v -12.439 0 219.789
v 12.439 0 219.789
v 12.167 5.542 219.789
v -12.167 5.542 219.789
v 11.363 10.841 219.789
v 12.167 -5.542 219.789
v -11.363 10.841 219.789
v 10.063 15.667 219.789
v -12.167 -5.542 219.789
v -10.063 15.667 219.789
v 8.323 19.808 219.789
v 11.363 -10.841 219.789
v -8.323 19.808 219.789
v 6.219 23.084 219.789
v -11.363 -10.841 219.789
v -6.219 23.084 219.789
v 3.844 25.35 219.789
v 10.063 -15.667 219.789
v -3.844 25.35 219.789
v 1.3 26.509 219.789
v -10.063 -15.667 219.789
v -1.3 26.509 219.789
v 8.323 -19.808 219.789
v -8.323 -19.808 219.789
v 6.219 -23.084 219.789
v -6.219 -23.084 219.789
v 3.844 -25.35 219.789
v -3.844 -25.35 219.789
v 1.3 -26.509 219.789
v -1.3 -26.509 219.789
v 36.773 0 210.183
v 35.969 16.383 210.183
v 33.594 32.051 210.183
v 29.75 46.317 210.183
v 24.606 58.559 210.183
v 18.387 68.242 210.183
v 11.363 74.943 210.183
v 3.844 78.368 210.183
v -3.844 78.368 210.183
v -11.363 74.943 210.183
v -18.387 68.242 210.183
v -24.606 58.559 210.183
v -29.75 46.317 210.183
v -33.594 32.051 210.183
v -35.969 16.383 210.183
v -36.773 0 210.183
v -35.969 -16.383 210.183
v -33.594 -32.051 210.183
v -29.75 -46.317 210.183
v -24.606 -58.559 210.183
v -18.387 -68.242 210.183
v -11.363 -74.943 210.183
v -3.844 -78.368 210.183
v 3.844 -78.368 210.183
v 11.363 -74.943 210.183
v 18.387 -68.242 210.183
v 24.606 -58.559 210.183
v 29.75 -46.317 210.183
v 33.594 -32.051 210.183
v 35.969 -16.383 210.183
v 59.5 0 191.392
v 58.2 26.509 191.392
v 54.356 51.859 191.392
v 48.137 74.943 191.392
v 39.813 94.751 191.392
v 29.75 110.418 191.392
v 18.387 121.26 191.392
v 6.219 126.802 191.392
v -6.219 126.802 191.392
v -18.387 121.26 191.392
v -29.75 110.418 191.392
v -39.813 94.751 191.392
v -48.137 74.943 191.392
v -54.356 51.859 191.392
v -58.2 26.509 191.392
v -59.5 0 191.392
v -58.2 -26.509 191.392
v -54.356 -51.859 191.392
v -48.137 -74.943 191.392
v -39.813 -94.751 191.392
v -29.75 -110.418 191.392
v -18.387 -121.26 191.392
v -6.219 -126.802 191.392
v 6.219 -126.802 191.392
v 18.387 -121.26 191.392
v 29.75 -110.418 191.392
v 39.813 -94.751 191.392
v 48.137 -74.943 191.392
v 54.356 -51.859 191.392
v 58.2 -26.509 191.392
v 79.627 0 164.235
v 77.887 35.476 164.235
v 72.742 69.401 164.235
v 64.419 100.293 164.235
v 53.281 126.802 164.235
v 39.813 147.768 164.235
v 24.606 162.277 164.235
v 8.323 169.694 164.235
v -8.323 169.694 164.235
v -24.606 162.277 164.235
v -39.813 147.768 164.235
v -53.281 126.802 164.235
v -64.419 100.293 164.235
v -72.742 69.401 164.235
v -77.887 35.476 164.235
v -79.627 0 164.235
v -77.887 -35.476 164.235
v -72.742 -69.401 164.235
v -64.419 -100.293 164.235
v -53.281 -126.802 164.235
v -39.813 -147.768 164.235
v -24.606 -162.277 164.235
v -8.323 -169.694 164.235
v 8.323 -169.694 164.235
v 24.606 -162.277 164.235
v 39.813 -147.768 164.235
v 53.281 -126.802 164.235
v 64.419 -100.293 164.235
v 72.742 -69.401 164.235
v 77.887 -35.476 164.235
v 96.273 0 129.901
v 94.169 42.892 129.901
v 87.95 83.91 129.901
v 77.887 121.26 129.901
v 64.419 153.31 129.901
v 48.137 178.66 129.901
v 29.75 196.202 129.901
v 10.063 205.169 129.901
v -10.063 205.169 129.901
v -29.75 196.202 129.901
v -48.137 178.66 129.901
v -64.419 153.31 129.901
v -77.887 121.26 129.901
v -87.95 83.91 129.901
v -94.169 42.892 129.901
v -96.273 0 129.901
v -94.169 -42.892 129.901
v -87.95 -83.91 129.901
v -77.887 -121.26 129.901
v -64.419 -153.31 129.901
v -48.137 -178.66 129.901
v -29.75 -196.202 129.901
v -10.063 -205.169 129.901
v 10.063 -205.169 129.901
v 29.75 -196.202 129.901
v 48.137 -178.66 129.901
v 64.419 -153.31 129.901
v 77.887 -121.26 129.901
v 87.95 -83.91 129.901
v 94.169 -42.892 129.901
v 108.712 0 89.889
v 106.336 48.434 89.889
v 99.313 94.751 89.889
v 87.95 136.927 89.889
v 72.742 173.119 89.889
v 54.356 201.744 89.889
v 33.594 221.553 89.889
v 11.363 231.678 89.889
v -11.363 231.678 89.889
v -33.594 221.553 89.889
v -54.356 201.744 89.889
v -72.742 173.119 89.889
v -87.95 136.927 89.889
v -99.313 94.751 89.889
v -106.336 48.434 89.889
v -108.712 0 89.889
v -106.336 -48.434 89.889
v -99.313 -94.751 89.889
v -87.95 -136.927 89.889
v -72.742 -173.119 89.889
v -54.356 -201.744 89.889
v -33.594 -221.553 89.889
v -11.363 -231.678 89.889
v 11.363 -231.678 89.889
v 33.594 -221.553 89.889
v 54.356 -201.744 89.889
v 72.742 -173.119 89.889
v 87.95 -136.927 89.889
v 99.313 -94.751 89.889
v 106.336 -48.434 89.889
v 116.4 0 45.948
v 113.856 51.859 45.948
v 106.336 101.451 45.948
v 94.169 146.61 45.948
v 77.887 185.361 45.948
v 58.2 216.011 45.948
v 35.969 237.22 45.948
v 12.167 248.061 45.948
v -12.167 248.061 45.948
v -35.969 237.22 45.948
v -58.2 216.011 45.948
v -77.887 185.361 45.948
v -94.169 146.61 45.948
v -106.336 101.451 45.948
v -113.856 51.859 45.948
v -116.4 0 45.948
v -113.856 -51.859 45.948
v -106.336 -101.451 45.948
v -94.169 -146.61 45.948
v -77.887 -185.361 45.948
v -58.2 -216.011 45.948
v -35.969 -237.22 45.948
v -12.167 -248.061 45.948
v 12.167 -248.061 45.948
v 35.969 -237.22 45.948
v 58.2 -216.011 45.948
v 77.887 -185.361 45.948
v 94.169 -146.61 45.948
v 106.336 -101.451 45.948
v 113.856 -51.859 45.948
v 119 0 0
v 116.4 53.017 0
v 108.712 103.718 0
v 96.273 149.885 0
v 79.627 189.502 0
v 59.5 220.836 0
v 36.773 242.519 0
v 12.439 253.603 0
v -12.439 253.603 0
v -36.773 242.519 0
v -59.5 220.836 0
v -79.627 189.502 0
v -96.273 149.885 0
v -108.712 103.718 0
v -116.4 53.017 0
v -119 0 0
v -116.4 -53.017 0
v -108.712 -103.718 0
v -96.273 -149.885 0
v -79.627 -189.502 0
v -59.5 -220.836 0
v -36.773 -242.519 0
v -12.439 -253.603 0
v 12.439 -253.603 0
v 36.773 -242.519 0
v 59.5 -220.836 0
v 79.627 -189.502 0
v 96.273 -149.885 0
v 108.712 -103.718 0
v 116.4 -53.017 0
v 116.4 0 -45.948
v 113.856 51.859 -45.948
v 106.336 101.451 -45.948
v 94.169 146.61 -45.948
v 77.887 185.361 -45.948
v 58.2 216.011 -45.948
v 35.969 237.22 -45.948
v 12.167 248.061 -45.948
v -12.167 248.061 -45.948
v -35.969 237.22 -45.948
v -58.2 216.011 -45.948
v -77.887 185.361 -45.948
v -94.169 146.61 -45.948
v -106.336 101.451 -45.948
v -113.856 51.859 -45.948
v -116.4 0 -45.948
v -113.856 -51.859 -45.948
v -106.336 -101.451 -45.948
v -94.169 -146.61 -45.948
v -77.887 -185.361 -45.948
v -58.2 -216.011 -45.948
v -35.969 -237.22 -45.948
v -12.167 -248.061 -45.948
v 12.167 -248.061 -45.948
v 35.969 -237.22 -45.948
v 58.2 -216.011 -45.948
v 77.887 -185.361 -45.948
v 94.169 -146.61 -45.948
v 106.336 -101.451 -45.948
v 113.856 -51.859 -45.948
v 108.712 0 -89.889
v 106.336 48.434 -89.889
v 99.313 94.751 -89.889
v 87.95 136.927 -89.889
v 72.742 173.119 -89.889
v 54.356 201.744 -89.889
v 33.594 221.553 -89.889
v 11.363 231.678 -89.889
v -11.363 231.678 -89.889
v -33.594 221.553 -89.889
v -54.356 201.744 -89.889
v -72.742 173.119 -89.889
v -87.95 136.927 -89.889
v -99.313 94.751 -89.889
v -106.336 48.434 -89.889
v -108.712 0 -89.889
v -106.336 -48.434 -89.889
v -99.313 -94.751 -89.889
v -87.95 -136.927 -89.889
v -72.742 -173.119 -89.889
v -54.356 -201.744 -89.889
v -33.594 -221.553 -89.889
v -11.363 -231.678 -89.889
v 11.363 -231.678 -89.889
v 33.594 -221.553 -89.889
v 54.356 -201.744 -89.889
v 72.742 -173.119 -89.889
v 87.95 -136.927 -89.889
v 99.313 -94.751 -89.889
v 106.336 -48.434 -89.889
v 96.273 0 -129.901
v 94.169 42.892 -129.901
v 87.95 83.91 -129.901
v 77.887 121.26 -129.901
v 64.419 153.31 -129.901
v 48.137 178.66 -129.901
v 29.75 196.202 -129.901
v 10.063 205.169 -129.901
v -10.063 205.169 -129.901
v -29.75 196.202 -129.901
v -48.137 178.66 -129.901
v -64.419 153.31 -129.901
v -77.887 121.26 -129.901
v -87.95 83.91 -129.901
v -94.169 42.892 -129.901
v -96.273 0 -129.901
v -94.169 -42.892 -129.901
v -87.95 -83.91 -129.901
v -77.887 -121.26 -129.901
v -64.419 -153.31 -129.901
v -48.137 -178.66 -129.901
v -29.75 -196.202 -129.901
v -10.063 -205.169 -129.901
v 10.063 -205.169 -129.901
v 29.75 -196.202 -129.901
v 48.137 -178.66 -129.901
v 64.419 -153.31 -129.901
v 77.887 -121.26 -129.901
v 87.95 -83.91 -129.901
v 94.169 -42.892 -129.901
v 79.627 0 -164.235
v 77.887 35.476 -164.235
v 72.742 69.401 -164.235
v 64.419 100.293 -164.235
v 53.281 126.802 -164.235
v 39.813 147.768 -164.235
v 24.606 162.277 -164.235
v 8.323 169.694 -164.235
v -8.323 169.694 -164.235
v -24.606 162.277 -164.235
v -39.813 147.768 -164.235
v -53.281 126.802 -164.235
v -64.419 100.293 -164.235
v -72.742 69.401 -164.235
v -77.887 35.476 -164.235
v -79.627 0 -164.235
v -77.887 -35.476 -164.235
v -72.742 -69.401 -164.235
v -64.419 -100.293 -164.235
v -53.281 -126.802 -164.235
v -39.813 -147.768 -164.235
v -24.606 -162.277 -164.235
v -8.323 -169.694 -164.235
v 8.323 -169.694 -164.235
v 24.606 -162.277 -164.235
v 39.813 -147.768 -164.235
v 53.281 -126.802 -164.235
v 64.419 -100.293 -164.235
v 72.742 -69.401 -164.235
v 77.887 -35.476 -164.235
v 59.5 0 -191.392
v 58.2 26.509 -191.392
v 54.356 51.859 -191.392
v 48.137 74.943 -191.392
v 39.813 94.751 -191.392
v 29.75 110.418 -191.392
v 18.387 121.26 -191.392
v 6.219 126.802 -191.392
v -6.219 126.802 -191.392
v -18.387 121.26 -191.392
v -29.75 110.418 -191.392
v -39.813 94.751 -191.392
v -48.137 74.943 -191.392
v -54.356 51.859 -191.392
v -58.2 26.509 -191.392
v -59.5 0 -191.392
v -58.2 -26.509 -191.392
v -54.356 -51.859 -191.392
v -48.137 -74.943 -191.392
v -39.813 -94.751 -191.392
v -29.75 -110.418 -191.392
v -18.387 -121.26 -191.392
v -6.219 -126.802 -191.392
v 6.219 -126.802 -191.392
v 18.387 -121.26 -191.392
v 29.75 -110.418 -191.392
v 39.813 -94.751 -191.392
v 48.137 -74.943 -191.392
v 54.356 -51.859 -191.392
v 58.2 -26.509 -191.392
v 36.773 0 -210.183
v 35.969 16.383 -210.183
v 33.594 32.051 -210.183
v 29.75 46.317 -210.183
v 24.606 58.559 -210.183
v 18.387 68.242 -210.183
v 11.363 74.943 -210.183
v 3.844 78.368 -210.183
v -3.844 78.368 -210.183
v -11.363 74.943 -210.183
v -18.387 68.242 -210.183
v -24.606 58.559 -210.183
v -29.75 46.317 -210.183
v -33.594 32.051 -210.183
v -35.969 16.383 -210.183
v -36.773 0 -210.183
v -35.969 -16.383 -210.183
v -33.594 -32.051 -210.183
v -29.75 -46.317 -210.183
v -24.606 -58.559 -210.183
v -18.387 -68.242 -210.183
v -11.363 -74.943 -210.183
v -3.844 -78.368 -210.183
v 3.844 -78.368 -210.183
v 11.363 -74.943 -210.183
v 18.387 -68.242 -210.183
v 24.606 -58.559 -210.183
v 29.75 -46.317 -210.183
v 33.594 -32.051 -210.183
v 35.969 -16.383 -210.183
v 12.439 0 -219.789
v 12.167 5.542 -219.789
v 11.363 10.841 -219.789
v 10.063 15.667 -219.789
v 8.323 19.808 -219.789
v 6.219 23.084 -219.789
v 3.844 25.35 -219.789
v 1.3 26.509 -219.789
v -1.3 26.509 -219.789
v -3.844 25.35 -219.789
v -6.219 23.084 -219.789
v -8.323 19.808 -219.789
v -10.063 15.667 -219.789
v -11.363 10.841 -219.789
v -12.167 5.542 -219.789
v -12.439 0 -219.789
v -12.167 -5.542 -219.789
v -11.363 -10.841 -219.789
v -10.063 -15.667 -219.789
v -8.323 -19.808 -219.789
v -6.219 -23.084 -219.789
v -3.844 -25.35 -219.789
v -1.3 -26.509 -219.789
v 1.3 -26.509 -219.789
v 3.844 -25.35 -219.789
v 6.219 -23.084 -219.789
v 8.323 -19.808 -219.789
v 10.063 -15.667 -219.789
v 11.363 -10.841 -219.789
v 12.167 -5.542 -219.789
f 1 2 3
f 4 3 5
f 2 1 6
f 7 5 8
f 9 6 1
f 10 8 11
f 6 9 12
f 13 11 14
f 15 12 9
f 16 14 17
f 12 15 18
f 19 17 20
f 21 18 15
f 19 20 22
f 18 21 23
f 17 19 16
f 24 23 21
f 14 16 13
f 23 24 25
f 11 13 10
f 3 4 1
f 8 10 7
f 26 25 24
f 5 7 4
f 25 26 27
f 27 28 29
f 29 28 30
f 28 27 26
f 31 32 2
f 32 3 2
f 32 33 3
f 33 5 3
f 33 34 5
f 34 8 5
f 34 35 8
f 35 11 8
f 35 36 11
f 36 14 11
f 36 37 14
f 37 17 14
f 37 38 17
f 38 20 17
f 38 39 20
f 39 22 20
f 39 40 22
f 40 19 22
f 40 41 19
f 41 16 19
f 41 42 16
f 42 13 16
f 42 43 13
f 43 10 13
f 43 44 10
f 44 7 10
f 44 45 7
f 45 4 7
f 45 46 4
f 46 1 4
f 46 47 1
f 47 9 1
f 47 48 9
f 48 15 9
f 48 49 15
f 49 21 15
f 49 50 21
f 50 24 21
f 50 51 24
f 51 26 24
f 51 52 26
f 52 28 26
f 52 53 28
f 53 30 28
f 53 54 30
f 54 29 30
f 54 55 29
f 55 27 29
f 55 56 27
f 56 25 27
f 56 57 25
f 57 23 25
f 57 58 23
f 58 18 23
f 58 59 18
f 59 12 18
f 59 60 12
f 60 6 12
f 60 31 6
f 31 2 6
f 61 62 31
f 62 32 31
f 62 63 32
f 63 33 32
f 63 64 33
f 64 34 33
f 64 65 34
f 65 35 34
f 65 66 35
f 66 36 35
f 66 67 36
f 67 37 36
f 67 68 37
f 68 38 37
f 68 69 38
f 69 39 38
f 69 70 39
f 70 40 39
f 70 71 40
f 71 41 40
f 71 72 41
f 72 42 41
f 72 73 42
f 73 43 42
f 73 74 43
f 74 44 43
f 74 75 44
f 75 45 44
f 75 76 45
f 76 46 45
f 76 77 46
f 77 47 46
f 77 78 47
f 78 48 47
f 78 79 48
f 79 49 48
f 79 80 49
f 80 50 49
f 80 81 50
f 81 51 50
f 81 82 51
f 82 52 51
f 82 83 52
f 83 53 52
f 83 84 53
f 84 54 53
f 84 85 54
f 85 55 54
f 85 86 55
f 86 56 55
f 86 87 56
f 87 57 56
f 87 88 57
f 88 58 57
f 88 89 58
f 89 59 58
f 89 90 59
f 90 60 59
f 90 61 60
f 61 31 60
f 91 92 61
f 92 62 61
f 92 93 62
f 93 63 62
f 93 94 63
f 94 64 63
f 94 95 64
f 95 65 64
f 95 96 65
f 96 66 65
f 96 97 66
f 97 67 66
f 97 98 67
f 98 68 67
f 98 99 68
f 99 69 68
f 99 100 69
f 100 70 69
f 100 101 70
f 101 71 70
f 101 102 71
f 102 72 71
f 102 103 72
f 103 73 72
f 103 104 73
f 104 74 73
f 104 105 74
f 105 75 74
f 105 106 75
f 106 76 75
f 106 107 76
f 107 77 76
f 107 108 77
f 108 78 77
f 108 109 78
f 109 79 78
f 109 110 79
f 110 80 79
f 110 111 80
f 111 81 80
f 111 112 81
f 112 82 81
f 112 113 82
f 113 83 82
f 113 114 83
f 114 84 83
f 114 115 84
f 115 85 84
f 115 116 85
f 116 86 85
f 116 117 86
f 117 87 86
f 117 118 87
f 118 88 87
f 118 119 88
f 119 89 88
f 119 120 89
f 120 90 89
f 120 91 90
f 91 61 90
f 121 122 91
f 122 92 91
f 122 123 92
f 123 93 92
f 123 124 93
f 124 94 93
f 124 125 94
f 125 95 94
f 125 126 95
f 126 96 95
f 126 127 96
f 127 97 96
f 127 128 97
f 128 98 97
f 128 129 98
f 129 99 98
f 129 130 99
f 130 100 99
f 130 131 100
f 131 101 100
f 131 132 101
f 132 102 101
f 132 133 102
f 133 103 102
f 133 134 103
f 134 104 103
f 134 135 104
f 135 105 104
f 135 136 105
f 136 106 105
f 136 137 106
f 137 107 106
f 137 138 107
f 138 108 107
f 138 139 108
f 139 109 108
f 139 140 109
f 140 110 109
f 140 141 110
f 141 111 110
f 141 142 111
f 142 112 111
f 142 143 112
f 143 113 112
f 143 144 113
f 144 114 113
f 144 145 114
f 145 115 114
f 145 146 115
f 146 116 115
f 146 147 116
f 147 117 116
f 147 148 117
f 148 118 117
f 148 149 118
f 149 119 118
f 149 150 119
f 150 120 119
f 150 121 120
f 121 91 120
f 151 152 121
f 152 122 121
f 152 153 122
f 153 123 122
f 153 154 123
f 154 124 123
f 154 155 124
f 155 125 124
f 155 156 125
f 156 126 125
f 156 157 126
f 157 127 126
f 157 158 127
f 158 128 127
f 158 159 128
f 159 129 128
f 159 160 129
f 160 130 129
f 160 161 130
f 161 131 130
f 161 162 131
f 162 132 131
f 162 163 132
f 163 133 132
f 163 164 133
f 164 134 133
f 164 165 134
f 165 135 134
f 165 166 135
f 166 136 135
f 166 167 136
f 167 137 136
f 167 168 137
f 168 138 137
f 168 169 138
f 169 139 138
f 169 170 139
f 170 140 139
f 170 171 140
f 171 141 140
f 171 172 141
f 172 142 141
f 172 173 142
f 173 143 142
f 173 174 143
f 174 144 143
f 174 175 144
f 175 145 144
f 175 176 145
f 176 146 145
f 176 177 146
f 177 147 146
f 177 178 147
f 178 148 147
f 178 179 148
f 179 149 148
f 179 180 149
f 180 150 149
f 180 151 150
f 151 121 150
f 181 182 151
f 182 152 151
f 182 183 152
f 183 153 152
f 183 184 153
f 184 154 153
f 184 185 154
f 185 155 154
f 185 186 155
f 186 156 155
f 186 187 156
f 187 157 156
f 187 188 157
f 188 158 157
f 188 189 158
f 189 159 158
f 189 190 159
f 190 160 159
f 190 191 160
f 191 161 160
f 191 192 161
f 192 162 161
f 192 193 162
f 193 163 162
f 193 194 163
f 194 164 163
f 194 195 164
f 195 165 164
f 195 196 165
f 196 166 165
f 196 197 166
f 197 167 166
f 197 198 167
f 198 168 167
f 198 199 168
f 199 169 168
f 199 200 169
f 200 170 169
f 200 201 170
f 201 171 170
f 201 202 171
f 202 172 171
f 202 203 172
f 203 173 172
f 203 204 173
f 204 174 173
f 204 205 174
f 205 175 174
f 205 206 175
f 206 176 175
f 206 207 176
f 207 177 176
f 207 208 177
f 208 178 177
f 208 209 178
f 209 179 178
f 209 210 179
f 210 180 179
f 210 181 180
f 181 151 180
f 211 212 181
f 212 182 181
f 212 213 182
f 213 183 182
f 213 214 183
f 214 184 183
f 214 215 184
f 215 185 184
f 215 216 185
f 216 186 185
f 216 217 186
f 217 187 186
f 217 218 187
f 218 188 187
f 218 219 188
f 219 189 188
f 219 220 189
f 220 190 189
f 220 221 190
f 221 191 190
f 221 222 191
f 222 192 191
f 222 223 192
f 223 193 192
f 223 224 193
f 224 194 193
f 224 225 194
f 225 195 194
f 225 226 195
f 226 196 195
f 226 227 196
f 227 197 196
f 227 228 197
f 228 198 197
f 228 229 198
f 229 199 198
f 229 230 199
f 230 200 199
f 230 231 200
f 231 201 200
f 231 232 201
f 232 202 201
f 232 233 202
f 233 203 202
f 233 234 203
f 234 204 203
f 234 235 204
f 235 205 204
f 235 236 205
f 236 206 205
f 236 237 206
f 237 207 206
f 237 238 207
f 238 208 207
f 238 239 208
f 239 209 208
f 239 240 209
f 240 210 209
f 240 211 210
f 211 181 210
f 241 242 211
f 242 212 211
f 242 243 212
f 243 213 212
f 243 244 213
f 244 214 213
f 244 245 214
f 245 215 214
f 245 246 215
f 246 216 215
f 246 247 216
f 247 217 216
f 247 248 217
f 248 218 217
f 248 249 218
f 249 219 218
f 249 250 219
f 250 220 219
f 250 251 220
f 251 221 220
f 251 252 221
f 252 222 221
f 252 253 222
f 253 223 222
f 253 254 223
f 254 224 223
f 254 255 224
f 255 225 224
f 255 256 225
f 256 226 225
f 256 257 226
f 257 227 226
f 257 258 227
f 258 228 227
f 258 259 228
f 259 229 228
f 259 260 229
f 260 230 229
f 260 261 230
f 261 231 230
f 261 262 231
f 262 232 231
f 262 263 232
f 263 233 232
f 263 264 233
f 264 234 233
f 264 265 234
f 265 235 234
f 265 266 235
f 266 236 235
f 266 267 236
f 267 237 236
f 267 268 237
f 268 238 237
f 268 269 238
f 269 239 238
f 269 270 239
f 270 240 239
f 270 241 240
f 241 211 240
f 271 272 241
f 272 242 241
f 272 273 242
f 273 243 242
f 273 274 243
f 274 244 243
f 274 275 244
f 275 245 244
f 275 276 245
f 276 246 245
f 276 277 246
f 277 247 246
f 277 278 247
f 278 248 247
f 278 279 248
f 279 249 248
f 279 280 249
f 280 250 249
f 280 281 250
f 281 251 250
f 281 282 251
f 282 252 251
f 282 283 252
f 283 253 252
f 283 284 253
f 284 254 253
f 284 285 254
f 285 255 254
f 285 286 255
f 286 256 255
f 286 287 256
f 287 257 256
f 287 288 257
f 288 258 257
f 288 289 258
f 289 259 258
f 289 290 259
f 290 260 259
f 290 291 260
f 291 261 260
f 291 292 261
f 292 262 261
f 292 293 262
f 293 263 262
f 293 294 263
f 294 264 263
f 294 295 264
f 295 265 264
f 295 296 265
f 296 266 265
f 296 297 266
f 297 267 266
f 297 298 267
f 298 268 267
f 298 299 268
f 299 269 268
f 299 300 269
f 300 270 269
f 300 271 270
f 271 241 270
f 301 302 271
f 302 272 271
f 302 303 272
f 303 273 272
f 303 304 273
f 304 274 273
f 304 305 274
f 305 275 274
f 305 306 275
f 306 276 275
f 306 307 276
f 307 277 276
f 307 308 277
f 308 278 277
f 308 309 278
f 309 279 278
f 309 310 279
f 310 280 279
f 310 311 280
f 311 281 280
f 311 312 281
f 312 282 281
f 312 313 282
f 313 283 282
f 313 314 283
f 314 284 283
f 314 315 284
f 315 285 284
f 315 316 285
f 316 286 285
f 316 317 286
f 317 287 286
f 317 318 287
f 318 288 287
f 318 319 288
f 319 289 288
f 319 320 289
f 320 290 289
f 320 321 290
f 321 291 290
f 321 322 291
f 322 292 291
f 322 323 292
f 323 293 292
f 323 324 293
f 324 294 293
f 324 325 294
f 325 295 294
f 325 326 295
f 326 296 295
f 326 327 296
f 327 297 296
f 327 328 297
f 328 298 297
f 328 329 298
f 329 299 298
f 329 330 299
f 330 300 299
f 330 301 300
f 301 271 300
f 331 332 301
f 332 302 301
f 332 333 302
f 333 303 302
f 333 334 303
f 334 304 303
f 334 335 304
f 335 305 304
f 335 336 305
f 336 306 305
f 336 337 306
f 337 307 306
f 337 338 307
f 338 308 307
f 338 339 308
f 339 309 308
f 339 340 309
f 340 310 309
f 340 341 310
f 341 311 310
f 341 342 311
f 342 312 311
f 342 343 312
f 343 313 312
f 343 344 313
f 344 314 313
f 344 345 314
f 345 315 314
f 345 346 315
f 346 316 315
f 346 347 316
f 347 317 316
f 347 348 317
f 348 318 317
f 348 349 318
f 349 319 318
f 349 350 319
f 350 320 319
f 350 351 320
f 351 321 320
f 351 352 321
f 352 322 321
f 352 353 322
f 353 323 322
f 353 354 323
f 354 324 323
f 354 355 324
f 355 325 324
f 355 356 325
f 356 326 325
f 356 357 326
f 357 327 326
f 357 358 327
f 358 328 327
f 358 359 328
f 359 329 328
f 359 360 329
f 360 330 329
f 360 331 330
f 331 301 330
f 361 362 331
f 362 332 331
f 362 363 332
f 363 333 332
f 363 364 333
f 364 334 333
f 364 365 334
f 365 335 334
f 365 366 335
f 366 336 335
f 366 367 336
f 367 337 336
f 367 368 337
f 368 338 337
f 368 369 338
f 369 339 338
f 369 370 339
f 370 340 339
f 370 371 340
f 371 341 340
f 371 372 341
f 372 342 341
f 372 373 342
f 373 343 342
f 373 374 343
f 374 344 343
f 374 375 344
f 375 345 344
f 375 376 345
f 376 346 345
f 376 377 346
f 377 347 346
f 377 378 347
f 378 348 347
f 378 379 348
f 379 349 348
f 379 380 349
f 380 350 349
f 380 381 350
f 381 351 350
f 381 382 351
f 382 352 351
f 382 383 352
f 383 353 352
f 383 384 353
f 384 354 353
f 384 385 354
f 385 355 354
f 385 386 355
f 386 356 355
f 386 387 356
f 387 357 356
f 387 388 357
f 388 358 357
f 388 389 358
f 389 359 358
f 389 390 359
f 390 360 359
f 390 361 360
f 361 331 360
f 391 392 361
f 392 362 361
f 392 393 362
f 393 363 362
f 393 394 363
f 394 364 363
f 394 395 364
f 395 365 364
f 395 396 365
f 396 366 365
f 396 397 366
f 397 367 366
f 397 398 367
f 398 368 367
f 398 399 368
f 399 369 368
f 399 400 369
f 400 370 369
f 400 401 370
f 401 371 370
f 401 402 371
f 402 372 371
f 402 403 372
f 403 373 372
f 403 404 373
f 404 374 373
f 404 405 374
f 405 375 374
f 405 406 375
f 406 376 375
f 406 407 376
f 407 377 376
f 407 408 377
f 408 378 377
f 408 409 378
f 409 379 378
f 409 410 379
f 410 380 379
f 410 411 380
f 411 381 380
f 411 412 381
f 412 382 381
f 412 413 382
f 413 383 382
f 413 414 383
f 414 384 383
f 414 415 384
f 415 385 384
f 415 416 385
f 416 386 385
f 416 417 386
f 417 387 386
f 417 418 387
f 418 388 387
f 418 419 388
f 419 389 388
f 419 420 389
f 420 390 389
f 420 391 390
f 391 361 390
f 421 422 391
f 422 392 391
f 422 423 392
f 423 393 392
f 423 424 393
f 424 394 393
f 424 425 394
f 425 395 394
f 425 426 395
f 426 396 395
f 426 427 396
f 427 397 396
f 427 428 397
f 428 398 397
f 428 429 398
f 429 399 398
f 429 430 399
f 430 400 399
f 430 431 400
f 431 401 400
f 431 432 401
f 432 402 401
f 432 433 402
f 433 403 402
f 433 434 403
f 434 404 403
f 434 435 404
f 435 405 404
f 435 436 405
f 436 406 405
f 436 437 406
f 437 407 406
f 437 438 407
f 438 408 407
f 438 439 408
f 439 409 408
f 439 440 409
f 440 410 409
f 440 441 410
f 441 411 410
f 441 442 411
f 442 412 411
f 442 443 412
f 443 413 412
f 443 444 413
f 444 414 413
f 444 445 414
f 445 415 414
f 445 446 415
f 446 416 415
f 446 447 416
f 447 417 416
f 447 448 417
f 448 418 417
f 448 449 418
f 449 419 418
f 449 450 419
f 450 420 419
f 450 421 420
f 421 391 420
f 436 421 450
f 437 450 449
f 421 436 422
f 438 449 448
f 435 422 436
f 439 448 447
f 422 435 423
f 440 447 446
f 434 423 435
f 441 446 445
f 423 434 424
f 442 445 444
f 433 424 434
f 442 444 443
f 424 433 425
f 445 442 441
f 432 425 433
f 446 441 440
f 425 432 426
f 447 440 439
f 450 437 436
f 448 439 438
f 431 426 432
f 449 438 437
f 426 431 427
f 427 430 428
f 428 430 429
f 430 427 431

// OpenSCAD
// Generated by SolidPython 1.0.1 on 2020-07-29 00:46:48


scale(v = [7, 15, 13]) {
	sphere(r = 17);
}
/***********************************************
*********      SolidPython code:      **********
************************************************
 
# import packages: SolidPython
from solid import *
from solid.utils import *
from itertools import chain, combinations, permutations


class Resize:

    def __init__(self, scad_file):
        self.scad_file = scad_file
        #self.scad_file = import_scad(scad_file)
        # cone/cylinder param:
        self.r1 = 0
        self.r2 = 0
        self.h = 0
        # rectangular prism param:
        self.w = 0
        self.l = 0
        # ellipse param:
        self.r = 0

    # import OpenScad code (file name corresponds to shape)


    # classify shape + parameters
    def assign(self, param1, param2, param3):
        if self.scad_file == 'cone.scad':
            self.r1 = param1
            self.r2 = param2
            self.h = param3
        elif self.scad_file == 'cylinder.scad':
            self.r1 = param1
            self.r2 = param2
            self.h = param3
        elif self.scad_file == 'rectangularPrism.scad':
            self.h = param1
            self.l = param2
            self.w = param3
        else:
            self.r = param1
            self.h = param2

    # resize parameters
    def iterate(self):
        x = range(3, 20, 2)
        i = 1
        if self.scad_file == 'cone.scad':
            tempList = list(permutations(x, 2))
            for temp in tempList:
                param1 = temp[0]
                param2 = temp[1]
                filepath = 'produced_scad_files/' + 'cone' + str(param1) + '_' + str(param2) + '_' + '.scad'
                scad_render_to_file(cylinder(h=param1, r1=param2, r2=0), filepath)

        elif self.scad_file == 'cylinder.scad':
            tempList = list(permutations(x, 3))
            for temp in tempList:
                param1 = temp[0]
                param2 = temp[1]
                filepath = 'produced_scad_files/' + 'cylinder' + str(param1) + '_' + str(param2) + '_' + '.scad'
                scad_render_to_file(cylinder(h=param1, r1=param2, r2=param2), filepath)

        elif self.scad_file == 'rectangularPrism.scad':
            tempList = list(permutations(x, 3))
            for temp in tempList:
                param1 = temp[0]
                param2 = temp[1]
                param3 = temp[2]
                filepath = 'produced_scad_files/' + 'rectangularPrism' + str(param1) + '_' + str(param2) + '_' + str(
                    param3) + '.scad'
                scad_render_to_file(cube(size=(param1, param2, param3)), filepath)

        elif self.scad_file == 'ellipse.scad':
            tempList = list(permutations(x, 4))
            for temp in tempList:
                param1 = temp[0]
                param2 = temp[1]
                param3 = temp[2]
                param4 = temp[3]
                filepath = 'produced_scad_files/' + 'ellipse' + str(param1) + '_' + str(param2) + '_' + str(param3) + '_' + str(param4) + '.scad'
                scad_render_to_file(scale([param1, param2, param3])(sphere(r=param4)), filepath)

    def render_to_scadfile(self):
        scad_render_to_file(scad, 'example.scad') 
 
************************************************/
